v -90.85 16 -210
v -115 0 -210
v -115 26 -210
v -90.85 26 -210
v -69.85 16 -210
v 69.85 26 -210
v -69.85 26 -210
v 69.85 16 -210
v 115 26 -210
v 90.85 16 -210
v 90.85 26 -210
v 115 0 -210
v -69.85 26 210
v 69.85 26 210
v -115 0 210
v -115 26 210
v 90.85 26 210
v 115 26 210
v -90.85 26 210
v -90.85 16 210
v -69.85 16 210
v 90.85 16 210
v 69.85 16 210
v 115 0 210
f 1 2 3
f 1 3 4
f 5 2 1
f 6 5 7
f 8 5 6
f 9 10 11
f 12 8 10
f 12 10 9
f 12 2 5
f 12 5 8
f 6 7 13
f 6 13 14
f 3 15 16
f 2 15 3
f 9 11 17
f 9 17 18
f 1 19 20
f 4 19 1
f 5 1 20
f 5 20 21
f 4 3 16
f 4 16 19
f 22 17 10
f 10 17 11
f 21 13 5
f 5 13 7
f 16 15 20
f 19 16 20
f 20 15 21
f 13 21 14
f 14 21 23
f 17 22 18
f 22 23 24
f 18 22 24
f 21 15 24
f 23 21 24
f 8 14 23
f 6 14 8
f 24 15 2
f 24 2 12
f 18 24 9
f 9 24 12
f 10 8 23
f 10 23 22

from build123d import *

# Parameters (mm, degrees)
SKETCH1_W           = 230
SKETCH1_H           = 420
BOSS_EXTRUDE1_DEPTH = 26
SKETCH2_W           = 21
SKETCH2_H           = 420
CUT_EXTRUDE1_DEPTH  = 10


with BuildPart() as part:
    # Sketch1 → Boss-Extrude1 (new body)
    with BuildSketch(Plane(origin=(0, 0, 0), x_dir=(1, 0, 0), z_dir=(0, 1, 0))):
        Rectangle(SKETCH1_W, SKETCH1_H)
    extrude(amount=BOSS_EXTRUDE1_DEPTH)

    # Sketch2 → Cut-Extrude1 (cut)
    with BuildSketch(Plane(origin=(0, 26, 0), x_dir=(1, 0, 0), z_dir=(0, 1, 0))):
        with Locations((-80.35, 0)):
            Rectangle(SKETCH2_W, SKETCH2_H)
        with Locations((80.35, 0)):
            Rectangle(SKETCH2_W, SKETCH2_H)
    extrude(amount=-CUT_EXTRUDE1_DEPTH, mode=Mode.SUBTRACT)


solid = part.part
